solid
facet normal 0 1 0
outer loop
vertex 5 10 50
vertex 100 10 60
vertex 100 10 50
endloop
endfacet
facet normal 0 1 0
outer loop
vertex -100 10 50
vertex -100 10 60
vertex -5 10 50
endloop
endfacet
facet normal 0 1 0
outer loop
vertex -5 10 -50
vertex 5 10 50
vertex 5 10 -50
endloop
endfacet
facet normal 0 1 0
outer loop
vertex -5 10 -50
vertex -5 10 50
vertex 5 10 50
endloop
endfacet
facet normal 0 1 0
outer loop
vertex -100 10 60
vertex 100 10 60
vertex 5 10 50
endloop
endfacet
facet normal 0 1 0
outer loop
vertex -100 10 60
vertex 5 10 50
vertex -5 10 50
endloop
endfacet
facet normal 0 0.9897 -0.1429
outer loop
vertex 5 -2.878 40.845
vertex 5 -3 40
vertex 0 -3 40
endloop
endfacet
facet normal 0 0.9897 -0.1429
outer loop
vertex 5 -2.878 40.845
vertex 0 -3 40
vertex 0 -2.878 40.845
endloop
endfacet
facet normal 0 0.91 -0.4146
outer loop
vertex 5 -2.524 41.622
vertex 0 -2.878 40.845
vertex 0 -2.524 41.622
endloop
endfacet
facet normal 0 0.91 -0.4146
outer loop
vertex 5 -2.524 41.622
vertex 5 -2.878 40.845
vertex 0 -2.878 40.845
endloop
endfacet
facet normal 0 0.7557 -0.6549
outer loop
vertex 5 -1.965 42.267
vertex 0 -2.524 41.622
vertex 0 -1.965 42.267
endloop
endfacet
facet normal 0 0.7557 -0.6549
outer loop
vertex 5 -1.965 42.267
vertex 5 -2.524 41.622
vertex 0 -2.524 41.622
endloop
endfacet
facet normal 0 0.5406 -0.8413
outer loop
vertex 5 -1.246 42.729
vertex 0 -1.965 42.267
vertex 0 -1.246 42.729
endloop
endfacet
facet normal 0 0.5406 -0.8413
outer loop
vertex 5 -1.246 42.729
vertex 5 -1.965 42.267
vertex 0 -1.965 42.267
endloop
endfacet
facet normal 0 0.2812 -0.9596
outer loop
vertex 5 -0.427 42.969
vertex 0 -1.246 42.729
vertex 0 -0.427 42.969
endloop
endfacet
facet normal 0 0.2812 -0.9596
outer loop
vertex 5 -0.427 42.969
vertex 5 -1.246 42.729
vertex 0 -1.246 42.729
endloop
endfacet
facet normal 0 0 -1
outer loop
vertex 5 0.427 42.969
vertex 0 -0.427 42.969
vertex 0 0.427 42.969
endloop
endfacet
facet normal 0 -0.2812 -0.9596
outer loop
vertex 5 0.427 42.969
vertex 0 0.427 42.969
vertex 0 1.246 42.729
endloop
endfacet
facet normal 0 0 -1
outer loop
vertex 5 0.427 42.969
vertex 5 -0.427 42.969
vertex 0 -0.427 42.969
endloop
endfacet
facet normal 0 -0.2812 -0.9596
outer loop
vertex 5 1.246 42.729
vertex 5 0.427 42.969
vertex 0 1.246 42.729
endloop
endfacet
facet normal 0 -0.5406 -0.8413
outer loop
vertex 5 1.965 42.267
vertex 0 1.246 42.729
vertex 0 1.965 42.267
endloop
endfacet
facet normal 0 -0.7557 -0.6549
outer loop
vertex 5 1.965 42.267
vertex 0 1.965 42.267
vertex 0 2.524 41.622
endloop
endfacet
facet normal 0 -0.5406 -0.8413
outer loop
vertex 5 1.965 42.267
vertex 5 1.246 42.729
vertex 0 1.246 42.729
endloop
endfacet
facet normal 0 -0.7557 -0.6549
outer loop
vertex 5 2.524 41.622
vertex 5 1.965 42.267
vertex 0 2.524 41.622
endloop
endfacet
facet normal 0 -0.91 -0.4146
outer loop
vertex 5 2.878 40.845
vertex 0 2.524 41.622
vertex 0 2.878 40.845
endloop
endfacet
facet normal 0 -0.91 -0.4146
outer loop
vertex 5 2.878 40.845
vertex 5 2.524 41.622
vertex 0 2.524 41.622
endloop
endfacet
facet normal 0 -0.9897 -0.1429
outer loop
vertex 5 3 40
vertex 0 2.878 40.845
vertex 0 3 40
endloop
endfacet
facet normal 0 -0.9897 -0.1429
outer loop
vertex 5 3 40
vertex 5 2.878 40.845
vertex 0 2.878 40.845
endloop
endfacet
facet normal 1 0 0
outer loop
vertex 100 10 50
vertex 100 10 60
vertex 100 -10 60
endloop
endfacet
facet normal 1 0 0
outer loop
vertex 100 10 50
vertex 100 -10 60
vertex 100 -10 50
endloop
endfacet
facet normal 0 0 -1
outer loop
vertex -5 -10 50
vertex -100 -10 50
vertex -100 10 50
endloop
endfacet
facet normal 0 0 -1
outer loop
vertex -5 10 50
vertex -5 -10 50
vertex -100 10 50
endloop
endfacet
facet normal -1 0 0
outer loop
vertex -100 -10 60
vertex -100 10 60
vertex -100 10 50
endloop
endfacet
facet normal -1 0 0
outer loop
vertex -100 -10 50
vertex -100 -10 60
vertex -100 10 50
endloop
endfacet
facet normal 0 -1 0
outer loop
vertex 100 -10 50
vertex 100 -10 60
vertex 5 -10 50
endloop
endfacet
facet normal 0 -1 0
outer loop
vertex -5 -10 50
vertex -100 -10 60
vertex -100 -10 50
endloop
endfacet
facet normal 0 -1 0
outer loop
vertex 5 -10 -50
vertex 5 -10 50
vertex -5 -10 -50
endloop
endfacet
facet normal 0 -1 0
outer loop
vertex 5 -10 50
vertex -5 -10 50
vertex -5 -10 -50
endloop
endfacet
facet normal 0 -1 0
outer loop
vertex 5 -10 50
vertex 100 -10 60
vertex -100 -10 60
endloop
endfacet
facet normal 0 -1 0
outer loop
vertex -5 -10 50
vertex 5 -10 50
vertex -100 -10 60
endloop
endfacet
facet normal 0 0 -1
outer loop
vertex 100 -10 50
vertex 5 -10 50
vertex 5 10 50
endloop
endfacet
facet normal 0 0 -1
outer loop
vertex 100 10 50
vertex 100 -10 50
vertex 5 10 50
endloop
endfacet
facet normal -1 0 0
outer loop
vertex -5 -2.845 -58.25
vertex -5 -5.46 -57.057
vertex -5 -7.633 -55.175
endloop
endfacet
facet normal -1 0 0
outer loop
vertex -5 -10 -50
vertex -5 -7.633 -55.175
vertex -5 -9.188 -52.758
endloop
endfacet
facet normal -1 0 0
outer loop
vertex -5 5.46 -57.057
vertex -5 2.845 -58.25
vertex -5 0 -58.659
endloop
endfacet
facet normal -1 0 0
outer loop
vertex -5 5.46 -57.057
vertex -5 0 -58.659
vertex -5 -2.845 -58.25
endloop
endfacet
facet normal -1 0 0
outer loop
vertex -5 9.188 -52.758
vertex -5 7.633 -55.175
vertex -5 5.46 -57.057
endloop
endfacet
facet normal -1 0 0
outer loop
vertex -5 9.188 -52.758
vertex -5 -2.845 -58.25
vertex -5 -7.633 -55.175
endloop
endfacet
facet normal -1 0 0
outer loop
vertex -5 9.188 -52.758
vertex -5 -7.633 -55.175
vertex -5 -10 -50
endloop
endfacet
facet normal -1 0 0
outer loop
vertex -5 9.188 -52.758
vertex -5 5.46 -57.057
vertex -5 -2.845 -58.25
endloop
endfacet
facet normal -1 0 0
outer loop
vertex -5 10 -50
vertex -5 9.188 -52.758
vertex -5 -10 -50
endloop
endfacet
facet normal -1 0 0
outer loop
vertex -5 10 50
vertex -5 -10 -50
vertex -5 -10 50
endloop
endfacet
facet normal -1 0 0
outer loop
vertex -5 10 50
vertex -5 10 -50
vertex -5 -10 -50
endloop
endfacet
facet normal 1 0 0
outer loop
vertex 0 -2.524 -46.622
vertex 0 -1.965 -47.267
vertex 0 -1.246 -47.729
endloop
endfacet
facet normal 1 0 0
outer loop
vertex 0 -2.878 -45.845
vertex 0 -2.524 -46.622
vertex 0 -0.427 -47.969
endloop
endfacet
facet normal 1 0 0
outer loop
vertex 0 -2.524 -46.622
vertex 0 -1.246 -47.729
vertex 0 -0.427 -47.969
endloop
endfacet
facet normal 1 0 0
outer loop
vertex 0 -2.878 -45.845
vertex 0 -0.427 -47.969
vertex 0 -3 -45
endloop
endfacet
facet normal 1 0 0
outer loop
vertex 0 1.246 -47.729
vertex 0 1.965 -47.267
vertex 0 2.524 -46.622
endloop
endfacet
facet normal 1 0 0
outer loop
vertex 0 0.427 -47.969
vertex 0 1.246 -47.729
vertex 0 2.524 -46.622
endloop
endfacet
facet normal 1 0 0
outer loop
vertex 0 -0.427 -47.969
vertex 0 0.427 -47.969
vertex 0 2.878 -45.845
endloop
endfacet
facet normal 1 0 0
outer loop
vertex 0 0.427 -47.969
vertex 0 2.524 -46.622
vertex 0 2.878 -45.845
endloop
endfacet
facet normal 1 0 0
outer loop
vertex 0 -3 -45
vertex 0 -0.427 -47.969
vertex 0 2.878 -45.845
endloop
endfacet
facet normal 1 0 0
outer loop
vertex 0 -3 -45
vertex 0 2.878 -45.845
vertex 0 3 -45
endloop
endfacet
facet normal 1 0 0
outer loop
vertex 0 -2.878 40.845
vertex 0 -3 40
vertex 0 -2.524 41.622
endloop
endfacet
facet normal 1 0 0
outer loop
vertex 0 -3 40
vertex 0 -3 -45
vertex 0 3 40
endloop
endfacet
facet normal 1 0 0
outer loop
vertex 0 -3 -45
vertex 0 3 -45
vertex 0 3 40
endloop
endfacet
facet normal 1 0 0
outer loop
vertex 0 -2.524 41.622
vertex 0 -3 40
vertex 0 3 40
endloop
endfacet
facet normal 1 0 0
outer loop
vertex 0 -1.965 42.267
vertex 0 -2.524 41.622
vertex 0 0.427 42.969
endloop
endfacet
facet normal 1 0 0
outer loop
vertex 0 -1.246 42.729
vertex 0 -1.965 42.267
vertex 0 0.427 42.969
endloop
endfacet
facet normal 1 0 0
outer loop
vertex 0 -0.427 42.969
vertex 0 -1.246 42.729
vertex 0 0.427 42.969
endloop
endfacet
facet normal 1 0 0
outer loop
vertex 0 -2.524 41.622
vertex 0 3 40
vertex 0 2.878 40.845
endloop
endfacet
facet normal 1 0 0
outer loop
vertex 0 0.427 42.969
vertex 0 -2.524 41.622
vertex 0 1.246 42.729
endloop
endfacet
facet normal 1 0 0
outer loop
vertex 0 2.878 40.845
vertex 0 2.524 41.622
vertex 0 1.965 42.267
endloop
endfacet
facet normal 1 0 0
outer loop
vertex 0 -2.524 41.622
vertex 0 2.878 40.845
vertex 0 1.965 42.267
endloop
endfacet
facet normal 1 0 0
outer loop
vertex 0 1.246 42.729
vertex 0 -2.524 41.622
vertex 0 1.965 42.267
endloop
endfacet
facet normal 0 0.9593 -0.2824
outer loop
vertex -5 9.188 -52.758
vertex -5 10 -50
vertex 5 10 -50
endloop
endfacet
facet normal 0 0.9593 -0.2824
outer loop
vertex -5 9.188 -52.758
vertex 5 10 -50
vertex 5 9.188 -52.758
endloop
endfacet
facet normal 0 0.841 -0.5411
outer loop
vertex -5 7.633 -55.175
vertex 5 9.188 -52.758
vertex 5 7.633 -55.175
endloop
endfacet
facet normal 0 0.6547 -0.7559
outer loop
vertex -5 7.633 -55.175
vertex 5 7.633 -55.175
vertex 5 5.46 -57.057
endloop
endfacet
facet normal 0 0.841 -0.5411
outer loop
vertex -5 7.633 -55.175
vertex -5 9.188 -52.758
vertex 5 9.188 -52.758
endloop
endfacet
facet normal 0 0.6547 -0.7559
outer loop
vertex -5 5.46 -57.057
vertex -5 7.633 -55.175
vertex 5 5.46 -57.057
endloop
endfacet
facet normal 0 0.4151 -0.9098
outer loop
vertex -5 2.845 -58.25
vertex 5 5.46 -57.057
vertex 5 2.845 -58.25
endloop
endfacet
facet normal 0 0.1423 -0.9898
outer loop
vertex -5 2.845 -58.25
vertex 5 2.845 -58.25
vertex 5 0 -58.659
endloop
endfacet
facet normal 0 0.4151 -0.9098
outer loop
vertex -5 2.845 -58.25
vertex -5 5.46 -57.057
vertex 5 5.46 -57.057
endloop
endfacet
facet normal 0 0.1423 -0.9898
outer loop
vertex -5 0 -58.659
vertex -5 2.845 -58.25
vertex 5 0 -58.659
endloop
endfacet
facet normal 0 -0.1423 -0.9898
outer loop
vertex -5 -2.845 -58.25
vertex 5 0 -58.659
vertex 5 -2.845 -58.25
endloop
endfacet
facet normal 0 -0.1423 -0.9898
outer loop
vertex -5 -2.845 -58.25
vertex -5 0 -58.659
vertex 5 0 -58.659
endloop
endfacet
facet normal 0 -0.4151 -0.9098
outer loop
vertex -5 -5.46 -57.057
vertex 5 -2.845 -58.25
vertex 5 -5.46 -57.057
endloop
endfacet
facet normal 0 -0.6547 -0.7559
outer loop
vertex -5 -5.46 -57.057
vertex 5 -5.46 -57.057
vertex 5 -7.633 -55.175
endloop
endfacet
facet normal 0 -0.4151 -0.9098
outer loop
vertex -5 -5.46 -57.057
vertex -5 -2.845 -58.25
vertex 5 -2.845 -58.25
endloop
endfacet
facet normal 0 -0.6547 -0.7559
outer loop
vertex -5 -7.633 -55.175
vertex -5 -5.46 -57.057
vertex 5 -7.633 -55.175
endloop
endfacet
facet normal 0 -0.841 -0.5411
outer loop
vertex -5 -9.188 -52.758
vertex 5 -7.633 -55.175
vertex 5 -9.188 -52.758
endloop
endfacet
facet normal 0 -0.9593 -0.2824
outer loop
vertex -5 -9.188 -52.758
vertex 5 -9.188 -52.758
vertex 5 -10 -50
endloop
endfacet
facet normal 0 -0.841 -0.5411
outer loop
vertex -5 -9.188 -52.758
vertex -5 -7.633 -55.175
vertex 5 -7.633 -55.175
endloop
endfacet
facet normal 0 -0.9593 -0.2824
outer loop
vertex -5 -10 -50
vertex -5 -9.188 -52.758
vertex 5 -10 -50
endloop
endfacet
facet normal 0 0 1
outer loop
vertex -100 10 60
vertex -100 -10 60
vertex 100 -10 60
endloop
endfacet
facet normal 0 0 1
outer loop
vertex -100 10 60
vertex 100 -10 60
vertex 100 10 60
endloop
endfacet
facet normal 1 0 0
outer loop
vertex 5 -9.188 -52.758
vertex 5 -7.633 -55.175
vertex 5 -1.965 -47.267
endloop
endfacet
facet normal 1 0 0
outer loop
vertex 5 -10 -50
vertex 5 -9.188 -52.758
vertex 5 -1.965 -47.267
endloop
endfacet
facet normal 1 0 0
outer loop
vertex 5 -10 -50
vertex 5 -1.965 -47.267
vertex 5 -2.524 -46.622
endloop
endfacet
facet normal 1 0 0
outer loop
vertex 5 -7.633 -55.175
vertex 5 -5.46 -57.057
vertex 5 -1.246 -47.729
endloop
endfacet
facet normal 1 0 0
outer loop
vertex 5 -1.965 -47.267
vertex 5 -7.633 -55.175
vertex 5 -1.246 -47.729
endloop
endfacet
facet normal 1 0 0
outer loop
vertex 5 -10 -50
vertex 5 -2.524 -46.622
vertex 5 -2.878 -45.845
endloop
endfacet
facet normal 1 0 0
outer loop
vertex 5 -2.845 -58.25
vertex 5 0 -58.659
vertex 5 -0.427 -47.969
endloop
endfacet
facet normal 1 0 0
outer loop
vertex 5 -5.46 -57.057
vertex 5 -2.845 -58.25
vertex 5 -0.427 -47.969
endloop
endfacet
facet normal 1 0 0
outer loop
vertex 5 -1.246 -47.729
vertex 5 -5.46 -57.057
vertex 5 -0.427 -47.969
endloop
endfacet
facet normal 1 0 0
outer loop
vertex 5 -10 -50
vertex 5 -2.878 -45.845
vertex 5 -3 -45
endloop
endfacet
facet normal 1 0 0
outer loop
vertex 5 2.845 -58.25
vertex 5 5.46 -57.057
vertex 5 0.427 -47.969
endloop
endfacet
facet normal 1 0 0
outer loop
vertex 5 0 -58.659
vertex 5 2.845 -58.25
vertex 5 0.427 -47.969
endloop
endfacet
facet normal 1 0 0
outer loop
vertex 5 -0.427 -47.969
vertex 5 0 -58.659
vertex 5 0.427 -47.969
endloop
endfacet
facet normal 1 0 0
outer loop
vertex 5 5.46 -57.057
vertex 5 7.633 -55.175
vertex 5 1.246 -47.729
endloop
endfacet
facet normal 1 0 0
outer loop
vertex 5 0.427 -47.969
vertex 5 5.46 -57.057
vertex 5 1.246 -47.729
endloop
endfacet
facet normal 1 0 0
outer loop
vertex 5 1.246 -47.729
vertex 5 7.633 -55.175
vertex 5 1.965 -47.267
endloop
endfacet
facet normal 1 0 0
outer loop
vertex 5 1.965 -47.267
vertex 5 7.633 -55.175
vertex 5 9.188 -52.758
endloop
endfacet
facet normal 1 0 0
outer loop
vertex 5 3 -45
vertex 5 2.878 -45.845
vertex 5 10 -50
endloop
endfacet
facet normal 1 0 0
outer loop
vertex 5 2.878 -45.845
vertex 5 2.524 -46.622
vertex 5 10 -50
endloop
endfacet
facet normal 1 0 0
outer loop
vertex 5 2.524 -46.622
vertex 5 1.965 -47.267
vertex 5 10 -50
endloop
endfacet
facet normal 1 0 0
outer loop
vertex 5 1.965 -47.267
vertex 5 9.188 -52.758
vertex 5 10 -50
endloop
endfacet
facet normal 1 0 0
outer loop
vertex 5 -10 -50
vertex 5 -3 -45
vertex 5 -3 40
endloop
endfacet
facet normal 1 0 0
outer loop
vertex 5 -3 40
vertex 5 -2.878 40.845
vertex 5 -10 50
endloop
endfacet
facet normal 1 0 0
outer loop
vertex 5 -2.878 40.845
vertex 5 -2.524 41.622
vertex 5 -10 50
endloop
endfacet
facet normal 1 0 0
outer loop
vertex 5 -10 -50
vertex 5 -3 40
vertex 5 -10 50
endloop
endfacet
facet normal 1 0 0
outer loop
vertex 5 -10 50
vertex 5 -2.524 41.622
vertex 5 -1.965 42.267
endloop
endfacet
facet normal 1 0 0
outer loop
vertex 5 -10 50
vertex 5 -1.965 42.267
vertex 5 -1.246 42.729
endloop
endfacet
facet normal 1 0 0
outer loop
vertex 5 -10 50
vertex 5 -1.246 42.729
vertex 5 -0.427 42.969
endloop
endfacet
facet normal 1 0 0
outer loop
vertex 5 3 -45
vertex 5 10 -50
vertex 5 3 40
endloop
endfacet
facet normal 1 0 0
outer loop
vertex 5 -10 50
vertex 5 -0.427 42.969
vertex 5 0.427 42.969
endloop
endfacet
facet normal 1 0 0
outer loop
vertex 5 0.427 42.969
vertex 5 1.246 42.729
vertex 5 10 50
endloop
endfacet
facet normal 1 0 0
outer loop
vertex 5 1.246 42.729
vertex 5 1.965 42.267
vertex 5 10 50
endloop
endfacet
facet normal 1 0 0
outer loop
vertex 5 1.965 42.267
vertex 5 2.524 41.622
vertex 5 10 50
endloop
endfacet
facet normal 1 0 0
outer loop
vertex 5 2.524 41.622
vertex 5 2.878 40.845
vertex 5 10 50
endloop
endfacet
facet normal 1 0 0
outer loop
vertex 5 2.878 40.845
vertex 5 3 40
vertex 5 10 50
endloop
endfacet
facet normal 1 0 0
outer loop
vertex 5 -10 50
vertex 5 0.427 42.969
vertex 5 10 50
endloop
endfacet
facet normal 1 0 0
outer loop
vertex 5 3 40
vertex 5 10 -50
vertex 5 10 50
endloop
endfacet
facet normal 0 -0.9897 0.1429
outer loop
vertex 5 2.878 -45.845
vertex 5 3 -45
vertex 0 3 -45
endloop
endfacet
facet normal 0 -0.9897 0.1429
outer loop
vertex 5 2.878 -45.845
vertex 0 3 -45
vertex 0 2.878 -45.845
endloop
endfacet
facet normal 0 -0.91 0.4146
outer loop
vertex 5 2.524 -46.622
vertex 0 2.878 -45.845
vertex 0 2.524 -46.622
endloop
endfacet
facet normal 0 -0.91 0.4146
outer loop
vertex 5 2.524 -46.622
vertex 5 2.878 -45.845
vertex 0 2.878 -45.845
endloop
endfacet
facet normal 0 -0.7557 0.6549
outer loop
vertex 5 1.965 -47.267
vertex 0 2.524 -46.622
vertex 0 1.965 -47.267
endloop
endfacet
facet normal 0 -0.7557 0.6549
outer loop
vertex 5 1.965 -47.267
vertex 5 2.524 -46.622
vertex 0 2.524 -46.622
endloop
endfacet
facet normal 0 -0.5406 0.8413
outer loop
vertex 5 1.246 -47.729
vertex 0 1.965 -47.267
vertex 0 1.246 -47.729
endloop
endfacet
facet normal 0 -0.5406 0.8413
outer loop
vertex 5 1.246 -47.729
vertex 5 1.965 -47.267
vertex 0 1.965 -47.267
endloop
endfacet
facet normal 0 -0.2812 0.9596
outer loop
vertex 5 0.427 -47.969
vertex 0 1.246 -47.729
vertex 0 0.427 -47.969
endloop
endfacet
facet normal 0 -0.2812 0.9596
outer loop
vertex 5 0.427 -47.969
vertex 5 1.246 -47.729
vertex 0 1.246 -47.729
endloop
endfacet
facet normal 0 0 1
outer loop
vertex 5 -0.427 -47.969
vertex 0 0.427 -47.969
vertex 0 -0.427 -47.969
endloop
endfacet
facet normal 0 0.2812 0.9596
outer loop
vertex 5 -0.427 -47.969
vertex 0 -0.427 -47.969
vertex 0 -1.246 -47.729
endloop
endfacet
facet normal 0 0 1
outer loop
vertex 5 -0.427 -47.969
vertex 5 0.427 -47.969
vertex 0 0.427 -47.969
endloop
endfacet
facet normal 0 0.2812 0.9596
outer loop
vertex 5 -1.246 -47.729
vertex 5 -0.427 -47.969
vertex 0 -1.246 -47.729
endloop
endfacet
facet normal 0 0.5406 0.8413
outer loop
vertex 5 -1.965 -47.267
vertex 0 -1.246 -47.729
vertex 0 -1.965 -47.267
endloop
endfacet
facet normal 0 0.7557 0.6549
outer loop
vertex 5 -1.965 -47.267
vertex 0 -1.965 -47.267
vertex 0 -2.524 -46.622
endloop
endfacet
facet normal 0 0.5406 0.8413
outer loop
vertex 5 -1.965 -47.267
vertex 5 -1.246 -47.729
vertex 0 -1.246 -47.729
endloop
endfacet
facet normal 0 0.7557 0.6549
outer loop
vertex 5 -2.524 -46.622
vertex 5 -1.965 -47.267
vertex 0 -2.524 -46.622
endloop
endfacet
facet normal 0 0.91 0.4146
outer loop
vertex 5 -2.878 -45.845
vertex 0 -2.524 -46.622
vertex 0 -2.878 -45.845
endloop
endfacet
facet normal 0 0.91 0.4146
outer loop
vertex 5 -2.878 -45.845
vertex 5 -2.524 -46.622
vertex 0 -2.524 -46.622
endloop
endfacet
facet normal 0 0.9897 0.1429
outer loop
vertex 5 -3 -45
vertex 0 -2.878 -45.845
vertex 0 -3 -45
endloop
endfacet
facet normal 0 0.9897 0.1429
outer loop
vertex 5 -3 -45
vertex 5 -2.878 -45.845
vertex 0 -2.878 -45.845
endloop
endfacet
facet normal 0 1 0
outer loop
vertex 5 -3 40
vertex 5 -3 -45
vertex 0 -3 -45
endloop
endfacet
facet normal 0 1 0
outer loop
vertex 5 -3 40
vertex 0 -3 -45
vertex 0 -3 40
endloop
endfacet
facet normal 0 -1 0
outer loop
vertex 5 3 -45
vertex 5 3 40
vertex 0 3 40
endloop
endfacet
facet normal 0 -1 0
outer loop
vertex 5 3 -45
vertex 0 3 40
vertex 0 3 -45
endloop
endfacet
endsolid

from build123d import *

# Parameters (mm, degrees)
BACK_START      = -5
SKETCH1_W       = 100
SKETCH1_H       = 20
BACK_DEPTH      = 10
CURVE_START     = -5
CURVE_END_DEPTH = 10
SLOT_START      = 5
SLOT_DEPTH      = 5
FRONT_START     = -100
SKETCH11_W      = 10
SKETCH11_H      = 20
FRONT_DEPTH     = 200


with BuildPart() as part:
    # Sketch1 → Back (new body)
    with BuildSketch(Plane(origin=(0, 0, 0), x_dir=(0, 0, -1), z_dir=(1, 0, 0)).offset(BACK_START)):
        Rectangle(SKETCH1_W, SKETCH1_H)
    extrude(amount=BACK_DEPTH)

    # Sketch5 → Curve End (add)
    with BuildSketch(Plane(origin=(0, 0, 0), x_dir=(0, 0, -1), z_dir=(1, 0, 0)).offset(CURVE_START)):
        with BuildLine():
            ThreePointArc((50, 10), (58.658985764, 0), (50, -10))
            Line((50, -10), (48.569993907, -0.102773996))
            ThreePointArc((48.569993907, -0.102773996), (48.658985764, 0), (48.569993907, 0.102773996))
            Line((48.569993907, 0.102773996), (50, 10))
        make_face()
    extrude(amount=CURVE_END_DEPTH)

    # Sketch7 → Slot (cut)
    with BuildSketch(Plane(origin=(0, 0, 0), x_dir=(0, 0, -1), z_dir=(1, 0, 0)).offset(SLOT_START)):
        with BuildLine():
            Line((-40, 3), (45, 3))
            ThreePointArc((45, 3), (48, 0), (45, -3))
            Line((45, -3), (-40, -3))
            ThreePointArc((-40, -3), (-43, 0), (-40, 3))
        make_face()
    extrude(amount=-SLOT_DEPTH, mode=Mode.SUBTRACT)

    # Sketch11 → Front (add)
    with BuildSketch(Plane(origin=(0, 0, 0), x_dir=(0, 0, -1), z_dir=(1, 0, 0)).offset(FRONT_START)):
        with Locations((-55, 0)):
            Rectangle(SKETCH11_W, SKETCH11_H)
    extrude(amount=FRONT_DEPTH)


solid = part.part
